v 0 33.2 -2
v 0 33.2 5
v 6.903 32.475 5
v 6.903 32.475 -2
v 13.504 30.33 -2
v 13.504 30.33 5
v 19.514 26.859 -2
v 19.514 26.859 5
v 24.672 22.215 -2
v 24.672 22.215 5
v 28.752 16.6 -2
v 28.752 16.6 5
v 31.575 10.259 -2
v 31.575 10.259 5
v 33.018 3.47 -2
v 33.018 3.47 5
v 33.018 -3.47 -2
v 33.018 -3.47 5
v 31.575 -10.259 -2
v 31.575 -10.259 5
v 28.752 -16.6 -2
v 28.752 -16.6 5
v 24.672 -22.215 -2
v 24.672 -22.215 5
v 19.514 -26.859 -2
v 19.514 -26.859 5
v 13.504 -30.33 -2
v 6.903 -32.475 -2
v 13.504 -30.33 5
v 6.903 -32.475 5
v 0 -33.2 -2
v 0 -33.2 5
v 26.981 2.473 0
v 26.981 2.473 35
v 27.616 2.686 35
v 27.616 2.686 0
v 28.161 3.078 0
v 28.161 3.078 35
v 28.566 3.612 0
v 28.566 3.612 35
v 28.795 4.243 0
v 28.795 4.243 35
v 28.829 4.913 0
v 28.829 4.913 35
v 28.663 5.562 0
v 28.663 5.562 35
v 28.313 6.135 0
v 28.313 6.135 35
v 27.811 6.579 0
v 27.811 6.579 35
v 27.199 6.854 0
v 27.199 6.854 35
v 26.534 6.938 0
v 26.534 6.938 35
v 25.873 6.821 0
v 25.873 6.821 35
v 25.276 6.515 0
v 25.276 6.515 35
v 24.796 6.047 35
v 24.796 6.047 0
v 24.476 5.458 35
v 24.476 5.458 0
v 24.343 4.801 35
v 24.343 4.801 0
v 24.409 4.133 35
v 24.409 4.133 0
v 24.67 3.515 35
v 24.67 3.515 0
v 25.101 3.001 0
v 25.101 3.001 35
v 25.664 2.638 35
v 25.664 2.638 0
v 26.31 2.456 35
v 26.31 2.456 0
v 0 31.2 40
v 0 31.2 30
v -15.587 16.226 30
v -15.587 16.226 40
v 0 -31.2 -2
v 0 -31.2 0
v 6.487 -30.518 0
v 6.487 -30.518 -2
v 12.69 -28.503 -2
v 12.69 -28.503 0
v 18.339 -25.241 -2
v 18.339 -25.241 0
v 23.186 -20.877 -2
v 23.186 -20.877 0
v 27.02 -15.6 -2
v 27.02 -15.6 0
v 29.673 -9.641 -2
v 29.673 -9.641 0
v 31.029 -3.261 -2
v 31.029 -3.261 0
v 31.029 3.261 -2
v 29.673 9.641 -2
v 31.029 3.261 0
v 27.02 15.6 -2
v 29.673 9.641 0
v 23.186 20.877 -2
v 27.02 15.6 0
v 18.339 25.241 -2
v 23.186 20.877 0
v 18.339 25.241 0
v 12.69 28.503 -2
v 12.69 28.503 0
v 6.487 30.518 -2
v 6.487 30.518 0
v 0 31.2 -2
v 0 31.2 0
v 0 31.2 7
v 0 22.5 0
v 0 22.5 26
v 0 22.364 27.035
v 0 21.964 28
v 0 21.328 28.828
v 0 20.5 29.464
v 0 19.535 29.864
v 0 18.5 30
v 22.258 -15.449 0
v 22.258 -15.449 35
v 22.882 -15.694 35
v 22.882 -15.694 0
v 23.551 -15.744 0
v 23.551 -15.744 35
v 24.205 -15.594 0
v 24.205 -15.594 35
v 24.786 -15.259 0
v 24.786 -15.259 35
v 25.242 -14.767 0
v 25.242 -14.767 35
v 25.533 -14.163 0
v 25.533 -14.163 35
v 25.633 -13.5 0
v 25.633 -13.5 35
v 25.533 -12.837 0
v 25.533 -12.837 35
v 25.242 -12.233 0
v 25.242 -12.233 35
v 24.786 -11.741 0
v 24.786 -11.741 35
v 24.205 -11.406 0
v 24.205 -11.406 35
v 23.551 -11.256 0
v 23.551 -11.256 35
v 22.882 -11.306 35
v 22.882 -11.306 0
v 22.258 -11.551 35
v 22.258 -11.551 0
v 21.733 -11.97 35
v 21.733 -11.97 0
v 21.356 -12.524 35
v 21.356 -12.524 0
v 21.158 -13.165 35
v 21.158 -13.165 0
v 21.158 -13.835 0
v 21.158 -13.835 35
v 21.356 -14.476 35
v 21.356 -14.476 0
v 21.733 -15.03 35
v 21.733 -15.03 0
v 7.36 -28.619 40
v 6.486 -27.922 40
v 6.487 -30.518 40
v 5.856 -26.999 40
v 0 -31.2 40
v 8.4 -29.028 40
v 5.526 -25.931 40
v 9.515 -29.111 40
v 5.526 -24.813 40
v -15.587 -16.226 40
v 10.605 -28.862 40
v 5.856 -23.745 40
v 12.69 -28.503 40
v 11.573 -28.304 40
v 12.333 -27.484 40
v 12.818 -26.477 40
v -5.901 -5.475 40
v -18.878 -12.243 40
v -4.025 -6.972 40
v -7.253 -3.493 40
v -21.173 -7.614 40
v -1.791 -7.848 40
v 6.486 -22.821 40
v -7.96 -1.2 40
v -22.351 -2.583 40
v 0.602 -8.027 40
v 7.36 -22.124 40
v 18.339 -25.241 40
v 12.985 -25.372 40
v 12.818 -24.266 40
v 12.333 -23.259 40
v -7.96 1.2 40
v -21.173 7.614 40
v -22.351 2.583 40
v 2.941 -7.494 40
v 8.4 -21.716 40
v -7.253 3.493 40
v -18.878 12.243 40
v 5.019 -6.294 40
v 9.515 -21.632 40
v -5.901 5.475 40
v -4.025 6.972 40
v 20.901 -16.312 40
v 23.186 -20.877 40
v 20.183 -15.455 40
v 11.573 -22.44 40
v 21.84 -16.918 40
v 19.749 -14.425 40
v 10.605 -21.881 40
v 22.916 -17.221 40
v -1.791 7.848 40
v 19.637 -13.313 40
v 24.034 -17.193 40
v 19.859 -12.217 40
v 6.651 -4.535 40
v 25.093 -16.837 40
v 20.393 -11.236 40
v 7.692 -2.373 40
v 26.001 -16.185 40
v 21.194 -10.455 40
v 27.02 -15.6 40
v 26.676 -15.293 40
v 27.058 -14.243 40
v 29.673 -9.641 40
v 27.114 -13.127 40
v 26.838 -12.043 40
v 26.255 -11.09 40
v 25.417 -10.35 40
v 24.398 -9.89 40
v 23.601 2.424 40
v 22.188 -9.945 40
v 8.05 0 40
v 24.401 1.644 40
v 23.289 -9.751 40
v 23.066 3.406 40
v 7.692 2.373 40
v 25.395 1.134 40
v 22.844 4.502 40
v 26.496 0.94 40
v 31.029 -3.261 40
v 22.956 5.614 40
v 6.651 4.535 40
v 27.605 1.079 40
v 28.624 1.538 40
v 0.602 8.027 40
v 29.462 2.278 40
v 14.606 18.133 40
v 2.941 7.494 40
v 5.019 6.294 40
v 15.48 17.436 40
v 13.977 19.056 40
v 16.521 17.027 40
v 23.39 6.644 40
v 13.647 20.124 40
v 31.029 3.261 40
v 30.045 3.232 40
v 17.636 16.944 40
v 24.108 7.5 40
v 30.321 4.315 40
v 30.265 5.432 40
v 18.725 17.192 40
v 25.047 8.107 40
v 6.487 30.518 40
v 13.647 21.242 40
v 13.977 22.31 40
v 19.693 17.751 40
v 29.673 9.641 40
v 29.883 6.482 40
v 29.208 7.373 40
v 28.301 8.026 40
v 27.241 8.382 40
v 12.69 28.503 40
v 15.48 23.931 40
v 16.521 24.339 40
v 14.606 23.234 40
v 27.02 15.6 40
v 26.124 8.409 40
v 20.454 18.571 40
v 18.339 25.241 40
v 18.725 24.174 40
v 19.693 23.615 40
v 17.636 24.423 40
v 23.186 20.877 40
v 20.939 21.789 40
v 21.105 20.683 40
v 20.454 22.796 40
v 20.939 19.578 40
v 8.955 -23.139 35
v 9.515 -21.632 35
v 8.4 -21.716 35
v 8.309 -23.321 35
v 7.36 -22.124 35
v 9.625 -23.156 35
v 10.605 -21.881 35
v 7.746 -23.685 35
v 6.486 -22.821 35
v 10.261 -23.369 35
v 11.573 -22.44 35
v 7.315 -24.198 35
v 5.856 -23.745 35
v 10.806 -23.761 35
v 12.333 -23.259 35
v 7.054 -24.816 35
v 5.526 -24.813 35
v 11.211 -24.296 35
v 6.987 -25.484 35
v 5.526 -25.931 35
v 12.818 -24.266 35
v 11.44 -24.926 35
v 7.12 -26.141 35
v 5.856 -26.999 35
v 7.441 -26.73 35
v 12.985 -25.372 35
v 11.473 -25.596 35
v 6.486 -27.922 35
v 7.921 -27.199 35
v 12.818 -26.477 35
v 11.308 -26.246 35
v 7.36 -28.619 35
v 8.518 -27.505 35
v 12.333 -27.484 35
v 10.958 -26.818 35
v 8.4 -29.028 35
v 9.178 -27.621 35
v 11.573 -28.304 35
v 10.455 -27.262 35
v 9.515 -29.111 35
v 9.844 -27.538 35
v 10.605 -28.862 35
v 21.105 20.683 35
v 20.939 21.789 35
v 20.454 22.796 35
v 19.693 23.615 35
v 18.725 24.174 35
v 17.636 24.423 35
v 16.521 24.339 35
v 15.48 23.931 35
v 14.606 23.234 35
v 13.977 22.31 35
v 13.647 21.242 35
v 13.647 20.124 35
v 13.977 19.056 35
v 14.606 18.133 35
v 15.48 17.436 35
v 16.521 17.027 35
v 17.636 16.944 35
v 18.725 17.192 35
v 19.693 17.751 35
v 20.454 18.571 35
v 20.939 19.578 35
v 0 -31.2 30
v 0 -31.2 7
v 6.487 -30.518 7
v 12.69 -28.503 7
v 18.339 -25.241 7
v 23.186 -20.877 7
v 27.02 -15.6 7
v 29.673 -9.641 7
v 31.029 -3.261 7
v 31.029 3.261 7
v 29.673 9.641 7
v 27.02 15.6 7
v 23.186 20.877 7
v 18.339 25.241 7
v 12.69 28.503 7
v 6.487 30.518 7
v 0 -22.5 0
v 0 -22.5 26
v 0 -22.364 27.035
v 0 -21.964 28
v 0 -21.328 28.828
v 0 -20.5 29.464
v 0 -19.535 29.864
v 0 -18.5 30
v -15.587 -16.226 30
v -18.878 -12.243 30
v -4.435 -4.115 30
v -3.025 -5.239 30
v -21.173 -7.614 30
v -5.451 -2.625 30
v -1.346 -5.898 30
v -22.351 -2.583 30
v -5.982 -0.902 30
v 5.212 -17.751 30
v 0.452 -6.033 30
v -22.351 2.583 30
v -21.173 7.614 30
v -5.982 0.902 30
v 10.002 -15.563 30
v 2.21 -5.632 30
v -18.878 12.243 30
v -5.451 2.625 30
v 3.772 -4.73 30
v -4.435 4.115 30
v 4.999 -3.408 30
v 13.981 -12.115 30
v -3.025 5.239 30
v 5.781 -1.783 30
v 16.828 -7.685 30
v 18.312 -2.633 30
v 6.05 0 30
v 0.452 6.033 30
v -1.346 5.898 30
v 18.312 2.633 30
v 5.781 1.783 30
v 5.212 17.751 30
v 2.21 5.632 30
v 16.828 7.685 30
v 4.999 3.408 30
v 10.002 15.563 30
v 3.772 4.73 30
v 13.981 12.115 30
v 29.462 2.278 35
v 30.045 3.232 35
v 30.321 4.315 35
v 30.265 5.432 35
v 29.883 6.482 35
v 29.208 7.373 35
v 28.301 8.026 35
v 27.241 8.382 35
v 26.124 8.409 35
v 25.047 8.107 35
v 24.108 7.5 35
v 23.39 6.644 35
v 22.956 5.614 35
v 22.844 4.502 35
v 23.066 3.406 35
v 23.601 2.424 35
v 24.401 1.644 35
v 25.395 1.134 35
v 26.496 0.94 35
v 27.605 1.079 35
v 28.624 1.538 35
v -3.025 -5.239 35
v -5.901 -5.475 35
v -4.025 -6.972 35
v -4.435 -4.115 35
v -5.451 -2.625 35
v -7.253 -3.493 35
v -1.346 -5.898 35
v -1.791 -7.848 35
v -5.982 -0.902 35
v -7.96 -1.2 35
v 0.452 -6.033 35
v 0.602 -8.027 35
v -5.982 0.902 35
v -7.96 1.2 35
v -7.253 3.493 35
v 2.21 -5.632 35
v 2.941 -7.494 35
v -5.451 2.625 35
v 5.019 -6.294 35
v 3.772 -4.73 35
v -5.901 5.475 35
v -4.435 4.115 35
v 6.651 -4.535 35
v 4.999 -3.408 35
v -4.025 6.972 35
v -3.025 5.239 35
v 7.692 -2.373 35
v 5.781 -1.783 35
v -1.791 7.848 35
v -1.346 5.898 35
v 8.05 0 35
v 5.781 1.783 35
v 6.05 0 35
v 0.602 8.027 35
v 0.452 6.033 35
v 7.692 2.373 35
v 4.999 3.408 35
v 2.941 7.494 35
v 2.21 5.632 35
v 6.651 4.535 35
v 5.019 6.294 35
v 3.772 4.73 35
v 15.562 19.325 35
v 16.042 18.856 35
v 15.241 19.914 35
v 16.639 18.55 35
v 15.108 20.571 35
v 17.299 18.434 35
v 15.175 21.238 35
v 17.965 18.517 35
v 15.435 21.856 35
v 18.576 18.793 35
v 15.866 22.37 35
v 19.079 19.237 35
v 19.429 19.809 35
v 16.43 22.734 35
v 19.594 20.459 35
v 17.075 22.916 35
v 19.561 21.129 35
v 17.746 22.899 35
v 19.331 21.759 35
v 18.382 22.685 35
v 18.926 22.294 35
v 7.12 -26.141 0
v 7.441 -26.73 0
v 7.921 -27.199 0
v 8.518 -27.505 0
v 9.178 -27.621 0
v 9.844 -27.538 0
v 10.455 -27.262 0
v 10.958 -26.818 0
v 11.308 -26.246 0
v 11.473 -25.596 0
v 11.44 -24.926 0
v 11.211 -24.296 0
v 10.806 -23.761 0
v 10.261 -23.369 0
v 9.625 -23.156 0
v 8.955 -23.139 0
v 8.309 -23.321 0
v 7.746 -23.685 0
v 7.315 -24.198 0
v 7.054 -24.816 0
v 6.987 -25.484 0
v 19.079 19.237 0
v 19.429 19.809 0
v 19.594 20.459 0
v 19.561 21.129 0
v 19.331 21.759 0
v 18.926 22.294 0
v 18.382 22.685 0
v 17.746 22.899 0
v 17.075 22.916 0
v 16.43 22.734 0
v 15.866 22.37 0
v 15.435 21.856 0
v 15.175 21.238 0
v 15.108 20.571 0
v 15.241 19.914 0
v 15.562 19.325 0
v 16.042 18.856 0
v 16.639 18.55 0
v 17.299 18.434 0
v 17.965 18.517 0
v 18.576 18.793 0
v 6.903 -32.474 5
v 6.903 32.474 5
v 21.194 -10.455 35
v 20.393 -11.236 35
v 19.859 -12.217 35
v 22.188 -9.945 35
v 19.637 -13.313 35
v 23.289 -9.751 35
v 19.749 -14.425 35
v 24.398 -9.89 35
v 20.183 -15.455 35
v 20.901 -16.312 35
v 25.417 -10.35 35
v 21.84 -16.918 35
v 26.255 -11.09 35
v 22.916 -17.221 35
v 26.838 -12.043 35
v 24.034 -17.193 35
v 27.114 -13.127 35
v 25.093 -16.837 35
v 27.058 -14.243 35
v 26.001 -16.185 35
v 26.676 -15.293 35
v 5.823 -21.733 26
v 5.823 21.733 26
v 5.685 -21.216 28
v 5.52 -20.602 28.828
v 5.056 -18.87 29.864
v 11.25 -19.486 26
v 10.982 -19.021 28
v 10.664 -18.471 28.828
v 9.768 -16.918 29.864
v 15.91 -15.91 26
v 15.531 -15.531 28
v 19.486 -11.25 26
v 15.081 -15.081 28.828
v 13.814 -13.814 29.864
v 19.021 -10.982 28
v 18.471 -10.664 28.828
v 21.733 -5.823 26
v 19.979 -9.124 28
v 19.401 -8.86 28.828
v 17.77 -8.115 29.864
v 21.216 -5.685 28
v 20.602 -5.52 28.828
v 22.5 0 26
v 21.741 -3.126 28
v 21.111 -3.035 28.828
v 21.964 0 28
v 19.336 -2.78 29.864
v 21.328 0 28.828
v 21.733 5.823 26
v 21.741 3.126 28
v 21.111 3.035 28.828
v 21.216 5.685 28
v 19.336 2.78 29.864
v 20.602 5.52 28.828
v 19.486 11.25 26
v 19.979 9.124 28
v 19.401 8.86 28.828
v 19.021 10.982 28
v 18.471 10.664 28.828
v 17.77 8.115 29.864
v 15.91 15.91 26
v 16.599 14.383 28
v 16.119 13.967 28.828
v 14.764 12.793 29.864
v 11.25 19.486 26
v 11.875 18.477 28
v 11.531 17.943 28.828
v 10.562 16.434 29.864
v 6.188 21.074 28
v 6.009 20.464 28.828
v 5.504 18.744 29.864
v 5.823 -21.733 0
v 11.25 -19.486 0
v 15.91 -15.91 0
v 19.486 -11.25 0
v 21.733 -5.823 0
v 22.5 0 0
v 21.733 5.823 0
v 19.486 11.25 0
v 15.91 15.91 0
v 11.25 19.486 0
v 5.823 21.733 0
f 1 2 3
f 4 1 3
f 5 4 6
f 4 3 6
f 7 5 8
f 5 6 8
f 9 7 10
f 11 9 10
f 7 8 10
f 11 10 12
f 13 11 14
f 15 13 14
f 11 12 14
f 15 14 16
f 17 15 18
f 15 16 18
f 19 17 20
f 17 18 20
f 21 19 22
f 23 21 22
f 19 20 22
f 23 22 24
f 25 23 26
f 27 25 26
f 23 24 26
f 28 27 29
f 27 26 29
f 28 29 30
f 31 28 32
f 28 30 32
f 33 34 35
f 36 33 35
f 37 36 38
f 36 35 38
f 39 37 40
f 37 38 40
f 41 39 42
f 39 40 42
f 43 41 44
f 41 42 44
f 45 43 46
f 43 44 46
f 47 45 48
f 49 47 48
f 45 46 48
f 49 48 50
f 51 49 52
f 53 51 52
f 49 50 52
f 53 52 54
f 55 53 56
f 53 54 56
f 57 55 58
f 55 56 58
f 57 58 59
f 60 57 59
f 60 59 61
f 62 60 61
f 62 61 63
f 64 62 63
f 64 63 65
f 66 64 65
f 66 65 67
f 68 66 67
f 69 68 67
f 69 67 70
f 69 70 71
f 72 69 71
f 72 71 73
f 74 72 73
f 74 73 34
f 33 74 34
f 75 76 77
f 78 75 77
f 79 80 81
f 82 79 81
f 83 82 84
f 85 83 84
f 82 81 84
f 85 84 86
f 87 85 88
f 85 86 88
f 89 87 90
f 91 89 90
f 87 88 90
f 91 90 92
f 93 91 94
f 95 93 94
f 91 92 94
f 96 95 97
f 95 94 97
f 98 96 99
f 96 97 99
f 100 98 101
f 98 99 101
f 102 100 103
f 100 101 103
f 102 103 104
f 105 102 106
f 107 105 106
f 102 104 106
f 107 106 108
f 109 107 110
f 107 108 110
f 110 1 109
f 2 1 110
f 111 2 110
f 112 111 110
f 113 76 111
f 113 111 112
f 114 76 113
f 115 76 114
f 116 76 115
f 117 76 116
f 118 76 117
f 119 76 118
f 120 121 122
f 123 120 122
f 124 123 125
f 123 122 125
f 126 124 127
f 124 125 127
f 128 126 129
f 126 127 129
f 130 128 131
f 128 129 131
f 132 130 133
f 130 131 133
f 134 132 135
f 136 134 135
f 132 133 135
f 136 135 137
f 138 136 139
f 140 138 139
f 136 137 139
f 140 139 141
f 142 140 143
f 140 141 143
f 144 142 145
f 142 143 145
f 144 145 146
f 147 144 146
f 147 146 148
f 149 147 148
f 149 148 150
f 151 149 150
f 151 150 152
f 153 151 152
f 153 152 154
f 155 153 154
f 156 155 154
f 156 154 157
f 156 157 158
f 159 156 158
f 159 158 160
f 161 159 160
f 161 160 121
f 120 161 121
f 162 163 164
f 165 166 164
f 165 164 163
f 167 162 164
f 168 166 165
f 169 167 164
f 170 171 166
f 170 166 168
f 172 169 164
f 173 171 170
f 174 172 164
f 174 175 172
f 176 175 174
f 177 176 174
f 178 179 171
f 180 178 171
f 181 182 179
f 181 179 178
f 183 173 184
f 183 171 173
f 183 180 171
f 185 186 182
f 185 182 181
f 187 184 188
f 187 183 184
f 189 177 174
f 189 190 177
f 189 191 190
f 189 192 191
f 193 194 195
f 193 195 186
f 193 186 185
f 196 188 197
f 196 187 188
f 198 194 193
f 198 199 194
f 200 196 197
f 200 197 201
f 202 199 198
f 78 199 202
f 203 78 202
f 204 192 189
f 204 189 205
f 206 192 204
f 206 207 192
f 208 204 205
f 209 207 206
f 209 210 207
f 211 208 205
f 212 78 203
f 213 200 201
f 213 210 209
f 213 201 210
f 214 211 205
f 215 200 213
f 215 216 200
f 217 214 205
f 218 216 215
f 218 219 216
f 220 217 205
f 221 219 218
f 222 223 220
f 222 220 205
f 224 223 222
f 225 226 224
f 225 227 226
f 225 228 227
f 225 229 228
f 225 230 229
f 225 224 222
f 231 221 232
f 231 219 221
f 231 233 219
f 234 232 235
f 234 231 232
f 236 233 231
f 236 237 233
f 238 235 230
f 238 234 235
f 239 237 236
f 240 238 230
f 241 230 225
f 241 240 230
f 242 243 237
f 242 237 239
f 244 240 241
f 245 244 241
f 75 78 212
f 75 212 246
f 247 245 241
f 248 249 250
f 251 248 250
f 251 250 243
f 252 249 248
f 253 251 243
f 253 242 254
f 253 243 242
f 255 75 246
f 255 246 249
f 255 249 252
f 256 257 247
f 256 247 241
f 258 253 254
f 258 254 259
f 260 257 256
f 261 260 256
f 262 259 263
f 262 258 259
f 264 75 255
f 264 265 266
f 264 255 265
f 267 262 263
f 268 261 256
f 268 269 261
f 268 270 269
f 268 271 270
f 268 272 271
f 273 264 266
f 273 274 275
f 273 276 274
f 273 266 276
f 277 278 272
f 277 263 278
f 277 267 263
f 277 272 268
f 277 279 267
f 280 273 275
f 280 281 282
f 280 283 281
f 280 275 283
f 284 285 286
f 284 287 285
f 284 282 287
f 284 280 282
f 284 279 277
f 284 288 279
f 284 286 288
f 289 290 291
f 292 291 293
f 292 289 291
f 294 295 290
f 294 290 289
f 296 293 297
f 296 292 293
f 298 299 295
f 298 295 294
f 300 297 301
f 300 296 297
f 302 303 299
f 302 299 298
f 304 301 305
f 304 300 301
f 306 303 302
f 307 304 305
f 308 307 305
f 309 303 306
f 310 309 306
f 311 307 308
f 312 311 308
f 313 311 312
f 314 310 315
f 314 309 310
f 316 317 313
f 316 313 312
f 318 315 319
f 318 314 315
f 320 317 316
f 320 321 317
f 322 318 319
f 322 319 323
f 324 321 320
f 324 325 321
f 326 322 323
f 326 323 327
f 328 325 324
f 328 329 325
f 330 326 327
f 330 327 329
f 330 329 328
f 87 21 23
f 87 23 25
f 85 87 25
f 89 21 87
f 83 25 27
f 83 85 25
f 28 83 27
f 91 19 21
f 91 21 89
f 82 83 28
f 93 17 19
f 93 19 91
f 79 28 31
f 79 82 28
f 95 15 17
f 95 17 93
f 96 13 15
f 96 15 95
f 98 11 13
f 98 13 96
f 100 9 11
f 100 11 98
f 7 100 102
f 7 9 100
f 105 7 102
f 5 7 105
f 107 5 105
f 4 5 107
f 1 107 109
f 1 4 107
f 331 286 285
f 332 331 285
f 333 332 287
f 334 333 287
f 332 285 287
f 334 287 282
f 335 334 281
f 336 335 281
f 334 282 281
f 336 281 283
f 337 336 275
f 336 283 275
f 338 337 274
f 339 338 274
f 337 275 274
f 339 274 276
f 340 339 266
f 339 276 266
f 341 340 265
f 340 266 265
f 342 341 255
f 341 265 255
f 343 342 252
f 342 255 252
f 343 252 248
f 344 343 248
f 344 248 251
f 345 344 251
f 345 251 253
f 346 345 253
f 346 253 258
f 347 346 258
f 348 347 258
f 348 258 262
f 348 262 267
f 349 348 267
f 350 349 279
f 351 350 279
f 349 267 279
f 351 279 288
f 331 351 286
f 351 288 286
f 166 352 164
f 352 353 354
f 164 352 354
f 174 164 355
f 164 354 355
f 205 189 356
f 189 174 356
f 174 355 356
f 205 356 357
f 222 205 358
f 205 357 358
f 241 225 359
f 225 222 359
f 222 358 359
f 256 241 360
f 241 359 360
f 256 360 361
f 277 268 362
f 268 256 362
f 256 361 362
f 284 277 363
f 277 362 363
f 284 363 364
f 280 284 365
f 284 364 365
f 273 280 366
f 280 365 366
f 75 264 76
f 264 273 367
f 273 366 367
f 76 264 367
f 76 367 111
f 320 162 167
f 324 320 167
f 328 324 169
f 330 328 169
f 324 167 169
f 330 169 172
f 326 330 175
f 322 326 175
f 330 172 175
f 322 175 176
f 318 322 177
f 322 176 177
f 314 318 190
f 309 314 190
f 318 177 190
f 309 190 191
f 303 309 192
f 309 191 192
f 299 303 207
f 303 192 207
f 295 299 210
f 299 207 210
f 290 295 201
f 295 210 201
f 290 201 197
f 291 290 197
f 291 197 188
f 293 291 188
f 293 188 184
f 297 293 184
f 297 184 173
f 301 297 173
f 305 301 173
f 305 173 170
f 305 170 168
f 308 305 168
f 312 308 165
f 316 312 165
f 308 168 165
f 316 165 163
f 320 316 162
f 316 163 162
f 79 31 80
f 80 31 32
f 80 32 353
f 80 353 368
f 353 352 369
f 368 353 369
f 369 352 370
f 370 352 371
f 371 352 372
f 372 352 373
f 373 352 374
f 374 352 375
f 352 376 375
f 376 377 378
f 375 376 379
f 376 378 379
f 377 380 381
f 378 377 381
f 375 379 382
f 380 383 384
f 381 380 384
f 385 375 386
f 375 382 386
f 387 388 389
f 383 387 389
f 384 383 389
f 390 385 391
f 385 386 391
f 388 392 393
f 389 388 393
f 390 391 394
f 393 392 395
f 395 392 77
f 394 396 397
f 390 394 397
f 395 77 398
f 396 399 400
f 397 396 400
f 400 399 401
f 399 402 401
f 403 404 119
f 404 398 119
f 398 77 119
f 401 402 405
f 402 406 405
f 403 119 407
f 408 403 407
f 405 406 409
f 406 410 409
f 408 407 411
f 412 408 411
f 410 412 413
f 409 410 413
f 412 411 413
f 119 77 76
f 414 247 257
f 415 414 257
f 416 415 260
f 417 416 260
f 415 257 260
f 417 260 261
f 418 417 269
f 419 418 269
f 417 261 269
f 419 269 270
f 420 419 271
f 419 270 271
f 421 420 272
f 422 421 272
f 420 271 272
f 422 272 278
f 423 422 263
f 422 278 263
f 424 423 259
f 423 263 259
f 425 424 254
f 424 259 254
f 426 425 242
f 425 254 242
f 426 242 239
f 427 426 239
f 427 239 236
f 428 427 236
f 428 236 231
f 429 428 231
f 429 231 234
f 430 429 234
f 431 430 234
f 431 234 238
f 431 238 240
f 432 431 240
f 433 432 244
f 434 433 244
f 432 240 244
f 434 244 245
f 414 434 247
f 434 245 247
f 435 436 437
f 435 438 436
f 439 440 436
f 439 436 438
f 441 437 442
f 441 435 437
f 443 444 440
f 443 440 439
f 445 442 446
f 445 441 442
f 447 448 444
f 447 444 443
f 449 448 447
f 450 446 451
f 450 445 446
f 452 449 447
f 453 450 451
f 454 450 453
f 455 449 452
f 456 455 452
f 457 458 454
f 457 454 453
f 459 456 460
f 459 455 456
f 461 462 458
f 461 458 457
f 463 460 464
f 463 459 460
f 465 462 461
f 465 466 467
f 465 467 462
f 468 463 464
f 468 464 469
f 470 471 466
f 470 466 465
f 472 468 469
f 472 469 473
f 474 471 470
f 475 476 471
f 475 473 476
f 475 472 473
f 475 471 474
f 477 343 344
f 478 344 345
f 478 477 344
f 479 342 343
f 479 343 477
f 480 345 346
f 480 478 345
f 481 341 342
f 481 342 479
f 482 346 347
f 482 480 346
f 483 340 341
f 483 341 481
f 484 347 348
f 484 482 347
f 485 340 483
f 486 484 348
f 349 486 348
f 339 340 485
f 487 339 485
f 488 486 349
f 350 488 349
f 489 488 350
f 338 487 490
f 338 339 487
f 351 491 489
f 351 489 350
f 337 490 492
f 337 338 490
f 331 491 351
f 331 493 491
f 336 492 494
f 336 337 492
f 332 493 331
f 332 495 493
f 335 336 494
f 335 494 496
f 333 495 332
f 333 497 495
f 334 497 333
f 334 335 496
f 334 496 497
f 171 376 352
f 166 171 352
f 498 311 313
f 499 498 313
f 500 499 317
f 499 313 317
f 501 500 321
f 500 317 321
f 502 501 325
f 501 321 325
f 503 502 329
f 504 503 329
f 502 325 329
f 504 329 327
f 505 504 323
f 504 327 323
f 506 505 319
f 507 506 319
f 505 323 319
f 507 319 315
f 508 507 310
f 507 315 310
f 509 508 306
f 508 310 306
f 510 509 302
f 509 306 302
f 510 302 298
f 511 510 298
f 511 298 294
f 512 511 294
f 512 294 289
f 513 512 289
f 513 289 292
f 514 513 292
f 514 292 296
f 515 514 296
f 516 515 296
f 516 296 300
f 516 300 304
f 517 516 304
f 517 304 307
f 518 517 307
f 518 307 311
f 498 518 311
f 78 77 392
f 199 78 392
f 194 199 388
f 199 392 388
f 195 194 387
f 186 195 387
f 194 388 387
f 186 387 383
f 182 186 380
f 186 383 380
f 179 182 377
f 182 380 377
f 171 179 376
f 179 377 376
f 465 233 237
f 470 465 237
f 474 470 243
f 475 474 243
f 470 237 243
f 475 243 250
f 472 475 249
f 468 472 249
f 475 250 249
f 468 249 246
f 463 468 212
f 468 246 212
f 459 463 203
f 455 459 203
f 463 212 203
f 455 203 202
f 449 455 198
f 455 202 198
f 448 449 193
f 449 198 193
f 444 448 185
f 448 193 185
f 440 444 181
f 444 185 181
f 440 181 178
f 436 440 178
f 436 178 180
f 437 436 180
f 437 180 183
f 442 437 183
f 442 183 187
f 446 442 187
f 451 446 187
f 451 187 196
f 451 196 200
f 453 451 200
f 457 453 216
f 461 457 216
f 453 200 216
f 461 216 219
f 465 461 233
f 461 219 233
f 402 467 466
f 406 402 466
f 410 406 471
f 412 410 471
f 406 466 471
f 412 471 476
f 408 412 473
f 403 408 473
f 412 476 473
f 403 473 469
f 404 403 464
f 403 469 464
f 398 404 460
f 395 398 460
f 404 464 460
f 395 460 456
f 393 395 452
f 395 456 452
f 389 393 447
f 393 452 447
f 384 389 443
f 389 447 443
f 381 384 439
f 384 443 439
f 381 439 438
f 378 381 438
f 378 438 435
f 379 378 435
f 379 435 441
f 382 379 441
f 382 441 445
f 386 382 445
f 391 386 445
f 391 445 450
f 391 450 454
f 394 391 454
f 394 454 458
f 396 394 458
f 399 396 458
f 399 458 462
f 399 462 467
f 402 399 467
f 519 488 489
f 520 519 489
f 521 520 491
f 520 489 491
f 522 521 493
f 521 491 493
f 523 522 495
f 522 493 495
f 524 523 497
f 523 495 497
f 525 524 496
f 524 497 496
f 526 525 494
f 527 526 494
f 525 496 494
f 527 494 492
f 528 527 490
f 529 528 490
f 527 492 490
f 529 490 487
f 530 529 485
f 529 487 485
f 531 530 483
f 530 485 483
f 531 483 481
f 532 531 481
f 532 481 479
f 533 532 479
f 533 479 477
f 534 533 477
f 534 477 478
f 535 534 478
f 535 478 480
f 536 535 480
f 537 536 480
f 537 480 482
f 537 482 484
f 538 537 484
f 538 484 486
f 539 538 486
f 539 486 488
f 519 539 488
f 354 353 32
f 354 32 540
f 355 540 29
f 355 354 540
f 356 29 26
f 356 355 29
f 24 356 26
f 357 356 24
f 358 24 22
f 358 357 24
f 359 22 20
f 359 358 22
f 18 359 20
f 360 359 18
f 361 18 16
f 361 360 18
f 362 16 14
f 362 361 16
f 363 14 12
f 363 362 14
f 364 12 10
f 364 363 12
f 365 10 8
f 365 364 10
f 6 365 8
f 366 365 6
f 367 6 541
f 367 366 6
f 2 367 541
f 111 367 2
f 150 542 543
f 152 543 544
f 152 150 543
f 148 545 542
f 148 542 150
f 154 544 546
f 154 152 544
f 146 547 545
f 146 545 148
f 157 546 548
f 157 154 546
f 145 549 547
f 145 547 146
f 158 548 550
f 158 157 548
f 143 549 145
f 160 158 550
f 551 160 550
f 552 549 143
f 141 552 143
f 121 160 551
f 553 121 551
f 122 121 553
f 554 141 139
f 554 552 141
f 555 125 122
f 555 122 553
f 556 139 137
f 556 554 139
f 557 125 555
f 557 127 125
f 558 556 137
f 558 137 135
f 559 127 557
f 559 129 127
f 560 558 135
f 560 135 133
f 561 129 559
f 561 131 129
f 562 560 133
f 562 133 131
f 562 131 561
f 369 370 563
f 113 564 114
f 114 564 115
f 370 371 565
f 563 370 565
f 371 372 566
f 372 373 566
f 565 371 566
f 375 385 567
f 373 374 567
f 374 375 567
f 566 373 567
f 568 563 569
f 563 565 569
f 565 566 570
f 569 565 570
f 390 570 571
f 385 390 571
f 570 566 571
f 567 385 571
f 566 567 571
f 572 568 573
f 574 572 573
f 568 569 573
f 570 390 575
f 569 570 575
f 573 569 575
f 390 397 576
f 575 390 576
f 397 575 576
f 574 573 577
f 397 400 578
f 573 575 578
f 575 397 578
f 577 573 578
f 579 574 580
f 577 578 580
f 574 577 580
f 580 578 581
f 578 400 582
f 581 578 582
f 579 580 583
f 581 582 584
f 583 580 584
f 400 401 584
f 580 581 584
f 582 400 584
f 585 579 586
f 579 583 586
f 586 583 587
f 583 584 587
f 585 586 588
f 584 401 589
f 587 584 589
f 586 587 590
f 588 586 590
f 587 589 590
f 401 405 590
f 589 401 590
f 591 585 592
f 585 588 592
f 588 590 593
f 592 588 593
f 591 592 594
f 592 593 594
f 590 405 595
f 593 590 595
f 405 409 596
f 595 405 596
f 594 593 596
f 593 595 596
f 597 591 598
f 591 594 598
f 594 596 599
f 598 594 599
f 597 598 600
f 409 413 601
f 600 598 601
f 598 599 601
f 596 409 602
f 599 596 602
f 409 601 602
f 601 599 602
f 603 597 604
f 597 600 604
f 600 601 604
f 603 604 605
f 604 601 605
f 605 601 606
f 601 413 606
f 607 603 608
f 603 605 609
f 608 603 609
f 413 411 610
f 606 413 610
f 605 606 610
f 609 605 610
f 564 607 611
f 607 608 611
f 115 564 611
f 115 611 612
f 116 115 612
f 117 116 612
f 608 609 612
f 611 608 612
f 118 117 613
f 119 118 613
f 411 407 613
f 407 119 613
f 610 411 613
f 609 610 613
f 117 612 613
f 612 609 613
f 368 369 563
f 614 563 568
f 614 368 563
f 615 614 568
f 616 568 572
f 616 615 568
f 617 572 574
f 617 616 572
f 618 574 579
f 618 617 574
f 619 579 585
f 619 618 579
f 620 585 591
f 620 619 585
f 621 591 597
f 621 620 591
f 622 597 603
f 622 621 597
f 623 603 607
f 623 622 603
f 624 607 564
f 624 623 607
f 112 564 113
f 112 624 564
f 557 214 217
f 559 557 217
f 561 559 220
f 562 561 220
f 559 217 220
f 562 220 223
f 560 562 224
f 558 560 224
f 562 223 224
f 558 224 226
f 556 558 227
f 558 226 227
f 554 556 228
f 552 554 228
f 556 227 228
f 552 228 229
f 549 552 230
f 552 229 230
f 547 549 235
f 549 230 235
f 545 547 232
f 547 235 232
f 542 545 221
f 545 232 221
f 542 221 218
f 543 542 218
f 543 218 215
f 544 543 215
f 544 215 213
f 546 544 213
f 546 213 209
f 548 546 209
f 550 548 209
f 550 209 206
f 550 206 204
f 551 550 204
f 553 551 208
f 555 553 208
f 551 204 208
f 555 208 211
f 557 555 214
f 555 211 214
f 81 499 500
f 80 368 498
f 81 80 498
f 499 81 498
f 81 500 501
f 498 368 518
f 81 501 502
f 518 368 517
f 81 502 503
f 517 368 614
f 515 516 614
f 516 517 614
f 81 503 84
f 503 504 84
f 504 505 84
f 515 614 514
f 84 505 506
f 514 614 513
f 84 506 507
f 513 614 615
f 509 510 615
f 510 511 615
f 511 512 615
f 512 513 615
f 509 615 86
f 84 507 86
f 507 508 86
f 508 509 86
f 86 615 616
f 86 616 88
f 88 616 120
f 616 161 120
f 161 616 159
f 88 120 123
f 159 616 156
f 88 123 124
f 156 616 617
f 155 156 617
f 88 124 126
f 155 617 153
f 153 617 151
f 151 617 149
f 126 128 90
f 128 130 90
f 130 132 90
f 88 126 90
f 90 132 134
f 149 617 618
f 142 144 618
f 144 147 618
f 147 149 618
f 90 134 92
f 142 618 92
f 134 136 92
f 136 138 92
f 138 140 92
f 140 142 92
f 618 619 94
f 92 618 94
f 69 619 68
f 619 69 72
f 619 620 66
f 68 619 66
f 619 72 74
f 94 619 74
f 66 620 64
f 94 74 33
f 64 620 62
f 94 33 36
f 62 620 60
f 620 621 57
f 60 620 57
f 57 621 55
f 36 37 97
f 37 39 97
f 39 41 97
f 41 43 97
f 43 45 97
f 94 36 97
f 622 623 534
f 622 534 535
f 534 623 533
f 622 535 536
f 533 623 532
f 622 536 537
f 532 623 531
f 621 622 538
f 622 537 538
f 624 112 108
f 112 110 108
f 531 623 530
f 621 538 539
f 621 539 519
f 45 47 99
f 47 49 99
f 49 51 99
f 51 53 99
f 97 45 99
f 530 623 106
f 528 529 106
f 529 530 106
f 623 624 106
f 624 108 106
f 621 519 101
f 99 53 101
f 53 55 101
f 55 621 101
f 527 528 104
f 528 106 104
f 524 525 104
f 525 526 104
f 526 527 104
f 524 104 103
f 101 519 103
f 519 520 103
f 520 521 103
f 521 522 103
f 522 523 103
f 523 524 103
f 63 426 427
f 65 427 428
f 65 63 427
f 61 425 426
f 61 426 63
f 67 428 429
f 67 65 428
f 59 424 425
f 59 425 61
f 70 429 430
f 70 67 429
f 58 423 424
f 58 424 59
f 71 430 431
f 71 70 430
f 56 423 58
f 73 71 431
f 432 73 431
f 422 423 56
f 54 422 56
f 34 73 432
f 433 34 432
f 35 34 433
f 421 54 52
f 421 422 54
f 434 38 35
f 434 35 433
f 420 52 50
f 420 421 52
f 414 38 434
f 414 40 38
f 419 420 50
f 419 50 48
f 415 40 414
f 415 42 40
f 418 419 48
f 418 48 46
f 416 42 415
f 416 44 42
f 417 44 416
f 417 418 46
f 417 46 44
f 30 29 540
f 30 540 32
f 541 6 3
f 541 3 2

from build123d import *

# Parameters (mm, degrees)
SCHIZZO1_R                        = 31.2
SCHIZZO1_R_2                      = 22.5
ESTRUSIONE_ESTRUSIONE1_DEPTH      = 40
SCHIZZO2_R                        = 2.25
TAGLIO_ESTRUSIONE1_DEPTH          = 60.555688225
RIPETIZIONECIRCOLARE1_COUNT       = 9
SCHIZZO3_W                        = 40
SCHIZZO3_H                        = 62.4
TAGLIO_ESTRUSIONE2_DEPTH          = 39
ESTRUSIONE_ESTRUSIONE2_START      = -10
ESTRUSIONE_ESTRUSIONE2_DEPTH      = 10
SCHIZZO5_R                        = 8.05
TAGLIO_ESTRUSIONE3_DEPTH          = 5
SCHIZZO6_R                        = 6.05
TAGLIO_ESTRUSIONE6_DEPTH          = 57.31944602
SCHIZZO7_R                        = 3.75
TAGLIO_ESTRUSIONE7_DEPTH          = 5
RIPETIZIONECIRCOLARE2_COUNT       = 9
ESTRUSIONE_ESTRUSIONE3_DEPTH      = 2
ESTRUSIONE_ESTRUSIONE3_DEPTH_BACK = 5
SMUSSO1_SIZE                      = 2
RACCORDO2_R                       = 4
ESTRUSIONE_ESTRUSIONE4_DEPTH      = 40
ESTRUSIONE_ESTRUSIONE5_START      = -10
ESTRUSIONE_ESTRUSIONE5_DEPTH      = 10


# Some blends are built 0.0001 mm under size
with BuildPart() as part:
    # Schizzo1 → Estrusione-Estrusione1 (new body)
    with BuildSketch(Plane.XY):
        Circle(SCHIZZO1_R)
        Circle(SCHIZZO1_R_2, mode=Mode.SUBTRACT)
    extrude(amount=ESTRUSIONE_ESTRUSIONE1_DEPTH)

    # Schizzo2 → Taglio-Estrusione1 (cut, through all)
    with BuildSketch(Plane.XY.offset(40)):
        with Locations((0, 27)):
            Circle(SCHIZZO2_R)
    taglio_estrusione1 = extrude(amount=-TAGLIO_ESTRUSIONE1_DEPTH, mode=Mode.SUBTRACT)

    # RipetizioneCircolare1: Taglio-Estrusione1 ×9 about axis
    ripetizionecircolare1_axis = Axis((0, 0, 0), (0, 0, 1))
    for i in range(1, RIPETIZIONECIRCOLARE1_COUNT):
        add(taglio_estrusione1.rotate(ripetizionecircolare1_axis, i * 360 / RIPETIZIONECIRCOLARE1_COUNT), mode=Mode.SUBTRACT)

    # Schizzo3 → Taglio-Estrusione2 (cut)
    with BuildSketch(Plane(origin=(0, 0, 0), x_dir=(0, 0, -1), z_dir=(1, 0, 0))):
        with Locations((-20, 0)):
            Rectangle(SCHIZZO3_W, SCHIZZO3_H)
    extrude(amount=-TAGLIO_ESTRUSIONE2_DEPTH, mode=Mode.SUBTRACT)

    # Schizzo4 → Estrusione-Estrusione2 (add)
    with BuildSketch(Plane.XY.offset(40).offset(ESTRUSIONE_ESTRUSIONE2_START)):
        with BuildLine():
            Line((0, 22.5), (0, -22.5))
            ThreePointArc((0, -22.5), (22.5, 0), (0, 22.5))
        make_face()
        with BuildLine():
            ThreePointArc((22.5, 0), (15.909902577, 15.909902577), (0, 22.5))
            Line((0, 22.5), (0, -22.5))
            ThreePointArc((0, -22.5), (15.909902577, -15.909902577), (22.5, 0))
        make_face()
        with BuildLine():
            Line((0, -22.5), (0, 22.5))
            ThreePointArc((0, 22.5), (-22.5, 0), (0, -22.5))
        make_face()
    extrude(amount=ESTRUSIONE_ESTRUSIONE2_DEPTH)

    # Schizzo5 → Taglio-Estrusione3 (cut)
    with BuildSketch(Plane.XY.offset(40)):
        Circle(SCHIZZO5_R)
    extrude(amount=-TAGLIO_ESTRUSIONE3_DEPTH, mode=Mode.SUBTRACT)

    # Schizzo6 → Taglio-Estrusione6 (cut, through all)
    with BuildSketch(Plane.XY.offset(35)):
        Circle(SCHIZZO6_R)
    extrude(amount=-TAGLIO_ESTRUSIONE6_DEPTH, mode=Mode.SUBTRACT)

    # Schizzo7 → Taglio-Estrusione7 (cut)
    with BuildSketch(Plane.XY.offset(40)):
        with Locations((17.355265462, 20.683199964)):
            Circle(SCHIZZO7_R)
    taglio_estrusione7 = extrude(amount=-TAGLIO_ESTRUSIONE7_DEPTH, mode=Mode.SUBTRACT)

    # RipetizioneCircolare2: Taglio-Estrusione7 ×9 about axis
    ripetizionecircolare2_axis = Axis((0, 0, 0), (0, 0, 1))
    for i in range(1, RIPETIZIONECIRCOLARE2_COUNT):
        add(taglio_estrusione7.rotate(ripetizionecircolare2_axis, i * 360 / RIPETIZIONECIRCOLARE2_COUNT), mode=Mode.SUBTRACT)

    # Schizzo8 → Estrusione-Estrusione3 (add, two sides: drawn at the far end of the back side and taken through both)
    with BuildSketch(Plane(origin=(0, 0, 0), x_dir=(-1, 0, 0), z_dir=(0, 0, -1)).offset(-ESTRUSIONE_ESTRUSIONE3_DEPTH_BACK)):
        with BuildLine():
            Line((0, 31.2), (0, 33.2))
            ThreePointArc((0, 33.2), (-33.2, 0), (0, -33.2))
            Line((0, -33.2), (0, -31.2))
            ThreePointArc((0, -31.2), (-31.2, 0), (0, 31.2))
        make_face()
    extrude(amount=ESTRUSIONE_ESTRUSIONE3_DEPTH + ESTRUSIONE_ESTRUSIONE3_DEPTH_BACK)

    # Smusso1
    smusso1_edges = [part.edges().sort_by_distance(p)[0] for p in [
        (31.2, 0, 5),
    ]]
    chamfer(smusso1_edges, length=SMUSSO1_SIZE - 0.0001)  # a hair under: the kernel refuses the full size

    # Raccordo2
    # the kernel refuses this fillet: 4 mm, written as the material it adds along each edge
    with BuildSketch(Plane(origin=(0, 0, 30), x_dir=(0, -1, 0), z_dir=(-1, 0, 0))) as raccordo2_piece_1:
        with BuildLine():
            CenterArc((22.5 - RACCORDO2_R, -RACCORDO2_R), RACCORDO2_R, 0, 90)
            Line((22.5 - RACCORDO2_R, 0), (22.5, 0))
            Line((22.5, 0), (22.5, -RACCORDO2_R))
        make_face()
    revolve(axis=Axis((0, 0, 30), (0, 0, 1)), revolution_arc=180)

    # Schizzo9 → Estrusione-Estrusione4 (add)
    with BuildSketch(Plane.XY.offset(40)):
        with BuildLine():
            Line((0, 30.75), (0, 23.25))
            ThreePointArc((0, 23.25), (3.75, 27), (0, 30.75))
        make_face()
    extrude(amount=-ESTRUSIONE_ESTRUSIONE4_DEPTH)

    # Schizzo10 → Estrusione-Estrusione5 (add)
    with BuildSketch(Plane.XY.offset(40).offset(ESTRUSIONE_ESTRUSIONE5_START)):
        with BuildLine():
            Line((0, 22.5), (0, 31.2))
            Line((0, 31.2), (-15.587436356, 16.225961538))
            ThreePointArc((-15.587436356, 16.225961538), (-8.40136493, 20.872639203), (0, 22.5))
        make_face()
        with BuildLine():
            ThreePointArc((0, -22.5), (-8.40136493, -20.872639203), (-15.587436356, -16.225961538))
            Line((-15.587436356, -16.225961538), (0, -31.2))
            Line((0, -31.2), (0, -22.5))
        make_face()
    extrude(amount=ESTRUSIONE_ESTRUSIONE5_DEPTH)


solid = part.part
